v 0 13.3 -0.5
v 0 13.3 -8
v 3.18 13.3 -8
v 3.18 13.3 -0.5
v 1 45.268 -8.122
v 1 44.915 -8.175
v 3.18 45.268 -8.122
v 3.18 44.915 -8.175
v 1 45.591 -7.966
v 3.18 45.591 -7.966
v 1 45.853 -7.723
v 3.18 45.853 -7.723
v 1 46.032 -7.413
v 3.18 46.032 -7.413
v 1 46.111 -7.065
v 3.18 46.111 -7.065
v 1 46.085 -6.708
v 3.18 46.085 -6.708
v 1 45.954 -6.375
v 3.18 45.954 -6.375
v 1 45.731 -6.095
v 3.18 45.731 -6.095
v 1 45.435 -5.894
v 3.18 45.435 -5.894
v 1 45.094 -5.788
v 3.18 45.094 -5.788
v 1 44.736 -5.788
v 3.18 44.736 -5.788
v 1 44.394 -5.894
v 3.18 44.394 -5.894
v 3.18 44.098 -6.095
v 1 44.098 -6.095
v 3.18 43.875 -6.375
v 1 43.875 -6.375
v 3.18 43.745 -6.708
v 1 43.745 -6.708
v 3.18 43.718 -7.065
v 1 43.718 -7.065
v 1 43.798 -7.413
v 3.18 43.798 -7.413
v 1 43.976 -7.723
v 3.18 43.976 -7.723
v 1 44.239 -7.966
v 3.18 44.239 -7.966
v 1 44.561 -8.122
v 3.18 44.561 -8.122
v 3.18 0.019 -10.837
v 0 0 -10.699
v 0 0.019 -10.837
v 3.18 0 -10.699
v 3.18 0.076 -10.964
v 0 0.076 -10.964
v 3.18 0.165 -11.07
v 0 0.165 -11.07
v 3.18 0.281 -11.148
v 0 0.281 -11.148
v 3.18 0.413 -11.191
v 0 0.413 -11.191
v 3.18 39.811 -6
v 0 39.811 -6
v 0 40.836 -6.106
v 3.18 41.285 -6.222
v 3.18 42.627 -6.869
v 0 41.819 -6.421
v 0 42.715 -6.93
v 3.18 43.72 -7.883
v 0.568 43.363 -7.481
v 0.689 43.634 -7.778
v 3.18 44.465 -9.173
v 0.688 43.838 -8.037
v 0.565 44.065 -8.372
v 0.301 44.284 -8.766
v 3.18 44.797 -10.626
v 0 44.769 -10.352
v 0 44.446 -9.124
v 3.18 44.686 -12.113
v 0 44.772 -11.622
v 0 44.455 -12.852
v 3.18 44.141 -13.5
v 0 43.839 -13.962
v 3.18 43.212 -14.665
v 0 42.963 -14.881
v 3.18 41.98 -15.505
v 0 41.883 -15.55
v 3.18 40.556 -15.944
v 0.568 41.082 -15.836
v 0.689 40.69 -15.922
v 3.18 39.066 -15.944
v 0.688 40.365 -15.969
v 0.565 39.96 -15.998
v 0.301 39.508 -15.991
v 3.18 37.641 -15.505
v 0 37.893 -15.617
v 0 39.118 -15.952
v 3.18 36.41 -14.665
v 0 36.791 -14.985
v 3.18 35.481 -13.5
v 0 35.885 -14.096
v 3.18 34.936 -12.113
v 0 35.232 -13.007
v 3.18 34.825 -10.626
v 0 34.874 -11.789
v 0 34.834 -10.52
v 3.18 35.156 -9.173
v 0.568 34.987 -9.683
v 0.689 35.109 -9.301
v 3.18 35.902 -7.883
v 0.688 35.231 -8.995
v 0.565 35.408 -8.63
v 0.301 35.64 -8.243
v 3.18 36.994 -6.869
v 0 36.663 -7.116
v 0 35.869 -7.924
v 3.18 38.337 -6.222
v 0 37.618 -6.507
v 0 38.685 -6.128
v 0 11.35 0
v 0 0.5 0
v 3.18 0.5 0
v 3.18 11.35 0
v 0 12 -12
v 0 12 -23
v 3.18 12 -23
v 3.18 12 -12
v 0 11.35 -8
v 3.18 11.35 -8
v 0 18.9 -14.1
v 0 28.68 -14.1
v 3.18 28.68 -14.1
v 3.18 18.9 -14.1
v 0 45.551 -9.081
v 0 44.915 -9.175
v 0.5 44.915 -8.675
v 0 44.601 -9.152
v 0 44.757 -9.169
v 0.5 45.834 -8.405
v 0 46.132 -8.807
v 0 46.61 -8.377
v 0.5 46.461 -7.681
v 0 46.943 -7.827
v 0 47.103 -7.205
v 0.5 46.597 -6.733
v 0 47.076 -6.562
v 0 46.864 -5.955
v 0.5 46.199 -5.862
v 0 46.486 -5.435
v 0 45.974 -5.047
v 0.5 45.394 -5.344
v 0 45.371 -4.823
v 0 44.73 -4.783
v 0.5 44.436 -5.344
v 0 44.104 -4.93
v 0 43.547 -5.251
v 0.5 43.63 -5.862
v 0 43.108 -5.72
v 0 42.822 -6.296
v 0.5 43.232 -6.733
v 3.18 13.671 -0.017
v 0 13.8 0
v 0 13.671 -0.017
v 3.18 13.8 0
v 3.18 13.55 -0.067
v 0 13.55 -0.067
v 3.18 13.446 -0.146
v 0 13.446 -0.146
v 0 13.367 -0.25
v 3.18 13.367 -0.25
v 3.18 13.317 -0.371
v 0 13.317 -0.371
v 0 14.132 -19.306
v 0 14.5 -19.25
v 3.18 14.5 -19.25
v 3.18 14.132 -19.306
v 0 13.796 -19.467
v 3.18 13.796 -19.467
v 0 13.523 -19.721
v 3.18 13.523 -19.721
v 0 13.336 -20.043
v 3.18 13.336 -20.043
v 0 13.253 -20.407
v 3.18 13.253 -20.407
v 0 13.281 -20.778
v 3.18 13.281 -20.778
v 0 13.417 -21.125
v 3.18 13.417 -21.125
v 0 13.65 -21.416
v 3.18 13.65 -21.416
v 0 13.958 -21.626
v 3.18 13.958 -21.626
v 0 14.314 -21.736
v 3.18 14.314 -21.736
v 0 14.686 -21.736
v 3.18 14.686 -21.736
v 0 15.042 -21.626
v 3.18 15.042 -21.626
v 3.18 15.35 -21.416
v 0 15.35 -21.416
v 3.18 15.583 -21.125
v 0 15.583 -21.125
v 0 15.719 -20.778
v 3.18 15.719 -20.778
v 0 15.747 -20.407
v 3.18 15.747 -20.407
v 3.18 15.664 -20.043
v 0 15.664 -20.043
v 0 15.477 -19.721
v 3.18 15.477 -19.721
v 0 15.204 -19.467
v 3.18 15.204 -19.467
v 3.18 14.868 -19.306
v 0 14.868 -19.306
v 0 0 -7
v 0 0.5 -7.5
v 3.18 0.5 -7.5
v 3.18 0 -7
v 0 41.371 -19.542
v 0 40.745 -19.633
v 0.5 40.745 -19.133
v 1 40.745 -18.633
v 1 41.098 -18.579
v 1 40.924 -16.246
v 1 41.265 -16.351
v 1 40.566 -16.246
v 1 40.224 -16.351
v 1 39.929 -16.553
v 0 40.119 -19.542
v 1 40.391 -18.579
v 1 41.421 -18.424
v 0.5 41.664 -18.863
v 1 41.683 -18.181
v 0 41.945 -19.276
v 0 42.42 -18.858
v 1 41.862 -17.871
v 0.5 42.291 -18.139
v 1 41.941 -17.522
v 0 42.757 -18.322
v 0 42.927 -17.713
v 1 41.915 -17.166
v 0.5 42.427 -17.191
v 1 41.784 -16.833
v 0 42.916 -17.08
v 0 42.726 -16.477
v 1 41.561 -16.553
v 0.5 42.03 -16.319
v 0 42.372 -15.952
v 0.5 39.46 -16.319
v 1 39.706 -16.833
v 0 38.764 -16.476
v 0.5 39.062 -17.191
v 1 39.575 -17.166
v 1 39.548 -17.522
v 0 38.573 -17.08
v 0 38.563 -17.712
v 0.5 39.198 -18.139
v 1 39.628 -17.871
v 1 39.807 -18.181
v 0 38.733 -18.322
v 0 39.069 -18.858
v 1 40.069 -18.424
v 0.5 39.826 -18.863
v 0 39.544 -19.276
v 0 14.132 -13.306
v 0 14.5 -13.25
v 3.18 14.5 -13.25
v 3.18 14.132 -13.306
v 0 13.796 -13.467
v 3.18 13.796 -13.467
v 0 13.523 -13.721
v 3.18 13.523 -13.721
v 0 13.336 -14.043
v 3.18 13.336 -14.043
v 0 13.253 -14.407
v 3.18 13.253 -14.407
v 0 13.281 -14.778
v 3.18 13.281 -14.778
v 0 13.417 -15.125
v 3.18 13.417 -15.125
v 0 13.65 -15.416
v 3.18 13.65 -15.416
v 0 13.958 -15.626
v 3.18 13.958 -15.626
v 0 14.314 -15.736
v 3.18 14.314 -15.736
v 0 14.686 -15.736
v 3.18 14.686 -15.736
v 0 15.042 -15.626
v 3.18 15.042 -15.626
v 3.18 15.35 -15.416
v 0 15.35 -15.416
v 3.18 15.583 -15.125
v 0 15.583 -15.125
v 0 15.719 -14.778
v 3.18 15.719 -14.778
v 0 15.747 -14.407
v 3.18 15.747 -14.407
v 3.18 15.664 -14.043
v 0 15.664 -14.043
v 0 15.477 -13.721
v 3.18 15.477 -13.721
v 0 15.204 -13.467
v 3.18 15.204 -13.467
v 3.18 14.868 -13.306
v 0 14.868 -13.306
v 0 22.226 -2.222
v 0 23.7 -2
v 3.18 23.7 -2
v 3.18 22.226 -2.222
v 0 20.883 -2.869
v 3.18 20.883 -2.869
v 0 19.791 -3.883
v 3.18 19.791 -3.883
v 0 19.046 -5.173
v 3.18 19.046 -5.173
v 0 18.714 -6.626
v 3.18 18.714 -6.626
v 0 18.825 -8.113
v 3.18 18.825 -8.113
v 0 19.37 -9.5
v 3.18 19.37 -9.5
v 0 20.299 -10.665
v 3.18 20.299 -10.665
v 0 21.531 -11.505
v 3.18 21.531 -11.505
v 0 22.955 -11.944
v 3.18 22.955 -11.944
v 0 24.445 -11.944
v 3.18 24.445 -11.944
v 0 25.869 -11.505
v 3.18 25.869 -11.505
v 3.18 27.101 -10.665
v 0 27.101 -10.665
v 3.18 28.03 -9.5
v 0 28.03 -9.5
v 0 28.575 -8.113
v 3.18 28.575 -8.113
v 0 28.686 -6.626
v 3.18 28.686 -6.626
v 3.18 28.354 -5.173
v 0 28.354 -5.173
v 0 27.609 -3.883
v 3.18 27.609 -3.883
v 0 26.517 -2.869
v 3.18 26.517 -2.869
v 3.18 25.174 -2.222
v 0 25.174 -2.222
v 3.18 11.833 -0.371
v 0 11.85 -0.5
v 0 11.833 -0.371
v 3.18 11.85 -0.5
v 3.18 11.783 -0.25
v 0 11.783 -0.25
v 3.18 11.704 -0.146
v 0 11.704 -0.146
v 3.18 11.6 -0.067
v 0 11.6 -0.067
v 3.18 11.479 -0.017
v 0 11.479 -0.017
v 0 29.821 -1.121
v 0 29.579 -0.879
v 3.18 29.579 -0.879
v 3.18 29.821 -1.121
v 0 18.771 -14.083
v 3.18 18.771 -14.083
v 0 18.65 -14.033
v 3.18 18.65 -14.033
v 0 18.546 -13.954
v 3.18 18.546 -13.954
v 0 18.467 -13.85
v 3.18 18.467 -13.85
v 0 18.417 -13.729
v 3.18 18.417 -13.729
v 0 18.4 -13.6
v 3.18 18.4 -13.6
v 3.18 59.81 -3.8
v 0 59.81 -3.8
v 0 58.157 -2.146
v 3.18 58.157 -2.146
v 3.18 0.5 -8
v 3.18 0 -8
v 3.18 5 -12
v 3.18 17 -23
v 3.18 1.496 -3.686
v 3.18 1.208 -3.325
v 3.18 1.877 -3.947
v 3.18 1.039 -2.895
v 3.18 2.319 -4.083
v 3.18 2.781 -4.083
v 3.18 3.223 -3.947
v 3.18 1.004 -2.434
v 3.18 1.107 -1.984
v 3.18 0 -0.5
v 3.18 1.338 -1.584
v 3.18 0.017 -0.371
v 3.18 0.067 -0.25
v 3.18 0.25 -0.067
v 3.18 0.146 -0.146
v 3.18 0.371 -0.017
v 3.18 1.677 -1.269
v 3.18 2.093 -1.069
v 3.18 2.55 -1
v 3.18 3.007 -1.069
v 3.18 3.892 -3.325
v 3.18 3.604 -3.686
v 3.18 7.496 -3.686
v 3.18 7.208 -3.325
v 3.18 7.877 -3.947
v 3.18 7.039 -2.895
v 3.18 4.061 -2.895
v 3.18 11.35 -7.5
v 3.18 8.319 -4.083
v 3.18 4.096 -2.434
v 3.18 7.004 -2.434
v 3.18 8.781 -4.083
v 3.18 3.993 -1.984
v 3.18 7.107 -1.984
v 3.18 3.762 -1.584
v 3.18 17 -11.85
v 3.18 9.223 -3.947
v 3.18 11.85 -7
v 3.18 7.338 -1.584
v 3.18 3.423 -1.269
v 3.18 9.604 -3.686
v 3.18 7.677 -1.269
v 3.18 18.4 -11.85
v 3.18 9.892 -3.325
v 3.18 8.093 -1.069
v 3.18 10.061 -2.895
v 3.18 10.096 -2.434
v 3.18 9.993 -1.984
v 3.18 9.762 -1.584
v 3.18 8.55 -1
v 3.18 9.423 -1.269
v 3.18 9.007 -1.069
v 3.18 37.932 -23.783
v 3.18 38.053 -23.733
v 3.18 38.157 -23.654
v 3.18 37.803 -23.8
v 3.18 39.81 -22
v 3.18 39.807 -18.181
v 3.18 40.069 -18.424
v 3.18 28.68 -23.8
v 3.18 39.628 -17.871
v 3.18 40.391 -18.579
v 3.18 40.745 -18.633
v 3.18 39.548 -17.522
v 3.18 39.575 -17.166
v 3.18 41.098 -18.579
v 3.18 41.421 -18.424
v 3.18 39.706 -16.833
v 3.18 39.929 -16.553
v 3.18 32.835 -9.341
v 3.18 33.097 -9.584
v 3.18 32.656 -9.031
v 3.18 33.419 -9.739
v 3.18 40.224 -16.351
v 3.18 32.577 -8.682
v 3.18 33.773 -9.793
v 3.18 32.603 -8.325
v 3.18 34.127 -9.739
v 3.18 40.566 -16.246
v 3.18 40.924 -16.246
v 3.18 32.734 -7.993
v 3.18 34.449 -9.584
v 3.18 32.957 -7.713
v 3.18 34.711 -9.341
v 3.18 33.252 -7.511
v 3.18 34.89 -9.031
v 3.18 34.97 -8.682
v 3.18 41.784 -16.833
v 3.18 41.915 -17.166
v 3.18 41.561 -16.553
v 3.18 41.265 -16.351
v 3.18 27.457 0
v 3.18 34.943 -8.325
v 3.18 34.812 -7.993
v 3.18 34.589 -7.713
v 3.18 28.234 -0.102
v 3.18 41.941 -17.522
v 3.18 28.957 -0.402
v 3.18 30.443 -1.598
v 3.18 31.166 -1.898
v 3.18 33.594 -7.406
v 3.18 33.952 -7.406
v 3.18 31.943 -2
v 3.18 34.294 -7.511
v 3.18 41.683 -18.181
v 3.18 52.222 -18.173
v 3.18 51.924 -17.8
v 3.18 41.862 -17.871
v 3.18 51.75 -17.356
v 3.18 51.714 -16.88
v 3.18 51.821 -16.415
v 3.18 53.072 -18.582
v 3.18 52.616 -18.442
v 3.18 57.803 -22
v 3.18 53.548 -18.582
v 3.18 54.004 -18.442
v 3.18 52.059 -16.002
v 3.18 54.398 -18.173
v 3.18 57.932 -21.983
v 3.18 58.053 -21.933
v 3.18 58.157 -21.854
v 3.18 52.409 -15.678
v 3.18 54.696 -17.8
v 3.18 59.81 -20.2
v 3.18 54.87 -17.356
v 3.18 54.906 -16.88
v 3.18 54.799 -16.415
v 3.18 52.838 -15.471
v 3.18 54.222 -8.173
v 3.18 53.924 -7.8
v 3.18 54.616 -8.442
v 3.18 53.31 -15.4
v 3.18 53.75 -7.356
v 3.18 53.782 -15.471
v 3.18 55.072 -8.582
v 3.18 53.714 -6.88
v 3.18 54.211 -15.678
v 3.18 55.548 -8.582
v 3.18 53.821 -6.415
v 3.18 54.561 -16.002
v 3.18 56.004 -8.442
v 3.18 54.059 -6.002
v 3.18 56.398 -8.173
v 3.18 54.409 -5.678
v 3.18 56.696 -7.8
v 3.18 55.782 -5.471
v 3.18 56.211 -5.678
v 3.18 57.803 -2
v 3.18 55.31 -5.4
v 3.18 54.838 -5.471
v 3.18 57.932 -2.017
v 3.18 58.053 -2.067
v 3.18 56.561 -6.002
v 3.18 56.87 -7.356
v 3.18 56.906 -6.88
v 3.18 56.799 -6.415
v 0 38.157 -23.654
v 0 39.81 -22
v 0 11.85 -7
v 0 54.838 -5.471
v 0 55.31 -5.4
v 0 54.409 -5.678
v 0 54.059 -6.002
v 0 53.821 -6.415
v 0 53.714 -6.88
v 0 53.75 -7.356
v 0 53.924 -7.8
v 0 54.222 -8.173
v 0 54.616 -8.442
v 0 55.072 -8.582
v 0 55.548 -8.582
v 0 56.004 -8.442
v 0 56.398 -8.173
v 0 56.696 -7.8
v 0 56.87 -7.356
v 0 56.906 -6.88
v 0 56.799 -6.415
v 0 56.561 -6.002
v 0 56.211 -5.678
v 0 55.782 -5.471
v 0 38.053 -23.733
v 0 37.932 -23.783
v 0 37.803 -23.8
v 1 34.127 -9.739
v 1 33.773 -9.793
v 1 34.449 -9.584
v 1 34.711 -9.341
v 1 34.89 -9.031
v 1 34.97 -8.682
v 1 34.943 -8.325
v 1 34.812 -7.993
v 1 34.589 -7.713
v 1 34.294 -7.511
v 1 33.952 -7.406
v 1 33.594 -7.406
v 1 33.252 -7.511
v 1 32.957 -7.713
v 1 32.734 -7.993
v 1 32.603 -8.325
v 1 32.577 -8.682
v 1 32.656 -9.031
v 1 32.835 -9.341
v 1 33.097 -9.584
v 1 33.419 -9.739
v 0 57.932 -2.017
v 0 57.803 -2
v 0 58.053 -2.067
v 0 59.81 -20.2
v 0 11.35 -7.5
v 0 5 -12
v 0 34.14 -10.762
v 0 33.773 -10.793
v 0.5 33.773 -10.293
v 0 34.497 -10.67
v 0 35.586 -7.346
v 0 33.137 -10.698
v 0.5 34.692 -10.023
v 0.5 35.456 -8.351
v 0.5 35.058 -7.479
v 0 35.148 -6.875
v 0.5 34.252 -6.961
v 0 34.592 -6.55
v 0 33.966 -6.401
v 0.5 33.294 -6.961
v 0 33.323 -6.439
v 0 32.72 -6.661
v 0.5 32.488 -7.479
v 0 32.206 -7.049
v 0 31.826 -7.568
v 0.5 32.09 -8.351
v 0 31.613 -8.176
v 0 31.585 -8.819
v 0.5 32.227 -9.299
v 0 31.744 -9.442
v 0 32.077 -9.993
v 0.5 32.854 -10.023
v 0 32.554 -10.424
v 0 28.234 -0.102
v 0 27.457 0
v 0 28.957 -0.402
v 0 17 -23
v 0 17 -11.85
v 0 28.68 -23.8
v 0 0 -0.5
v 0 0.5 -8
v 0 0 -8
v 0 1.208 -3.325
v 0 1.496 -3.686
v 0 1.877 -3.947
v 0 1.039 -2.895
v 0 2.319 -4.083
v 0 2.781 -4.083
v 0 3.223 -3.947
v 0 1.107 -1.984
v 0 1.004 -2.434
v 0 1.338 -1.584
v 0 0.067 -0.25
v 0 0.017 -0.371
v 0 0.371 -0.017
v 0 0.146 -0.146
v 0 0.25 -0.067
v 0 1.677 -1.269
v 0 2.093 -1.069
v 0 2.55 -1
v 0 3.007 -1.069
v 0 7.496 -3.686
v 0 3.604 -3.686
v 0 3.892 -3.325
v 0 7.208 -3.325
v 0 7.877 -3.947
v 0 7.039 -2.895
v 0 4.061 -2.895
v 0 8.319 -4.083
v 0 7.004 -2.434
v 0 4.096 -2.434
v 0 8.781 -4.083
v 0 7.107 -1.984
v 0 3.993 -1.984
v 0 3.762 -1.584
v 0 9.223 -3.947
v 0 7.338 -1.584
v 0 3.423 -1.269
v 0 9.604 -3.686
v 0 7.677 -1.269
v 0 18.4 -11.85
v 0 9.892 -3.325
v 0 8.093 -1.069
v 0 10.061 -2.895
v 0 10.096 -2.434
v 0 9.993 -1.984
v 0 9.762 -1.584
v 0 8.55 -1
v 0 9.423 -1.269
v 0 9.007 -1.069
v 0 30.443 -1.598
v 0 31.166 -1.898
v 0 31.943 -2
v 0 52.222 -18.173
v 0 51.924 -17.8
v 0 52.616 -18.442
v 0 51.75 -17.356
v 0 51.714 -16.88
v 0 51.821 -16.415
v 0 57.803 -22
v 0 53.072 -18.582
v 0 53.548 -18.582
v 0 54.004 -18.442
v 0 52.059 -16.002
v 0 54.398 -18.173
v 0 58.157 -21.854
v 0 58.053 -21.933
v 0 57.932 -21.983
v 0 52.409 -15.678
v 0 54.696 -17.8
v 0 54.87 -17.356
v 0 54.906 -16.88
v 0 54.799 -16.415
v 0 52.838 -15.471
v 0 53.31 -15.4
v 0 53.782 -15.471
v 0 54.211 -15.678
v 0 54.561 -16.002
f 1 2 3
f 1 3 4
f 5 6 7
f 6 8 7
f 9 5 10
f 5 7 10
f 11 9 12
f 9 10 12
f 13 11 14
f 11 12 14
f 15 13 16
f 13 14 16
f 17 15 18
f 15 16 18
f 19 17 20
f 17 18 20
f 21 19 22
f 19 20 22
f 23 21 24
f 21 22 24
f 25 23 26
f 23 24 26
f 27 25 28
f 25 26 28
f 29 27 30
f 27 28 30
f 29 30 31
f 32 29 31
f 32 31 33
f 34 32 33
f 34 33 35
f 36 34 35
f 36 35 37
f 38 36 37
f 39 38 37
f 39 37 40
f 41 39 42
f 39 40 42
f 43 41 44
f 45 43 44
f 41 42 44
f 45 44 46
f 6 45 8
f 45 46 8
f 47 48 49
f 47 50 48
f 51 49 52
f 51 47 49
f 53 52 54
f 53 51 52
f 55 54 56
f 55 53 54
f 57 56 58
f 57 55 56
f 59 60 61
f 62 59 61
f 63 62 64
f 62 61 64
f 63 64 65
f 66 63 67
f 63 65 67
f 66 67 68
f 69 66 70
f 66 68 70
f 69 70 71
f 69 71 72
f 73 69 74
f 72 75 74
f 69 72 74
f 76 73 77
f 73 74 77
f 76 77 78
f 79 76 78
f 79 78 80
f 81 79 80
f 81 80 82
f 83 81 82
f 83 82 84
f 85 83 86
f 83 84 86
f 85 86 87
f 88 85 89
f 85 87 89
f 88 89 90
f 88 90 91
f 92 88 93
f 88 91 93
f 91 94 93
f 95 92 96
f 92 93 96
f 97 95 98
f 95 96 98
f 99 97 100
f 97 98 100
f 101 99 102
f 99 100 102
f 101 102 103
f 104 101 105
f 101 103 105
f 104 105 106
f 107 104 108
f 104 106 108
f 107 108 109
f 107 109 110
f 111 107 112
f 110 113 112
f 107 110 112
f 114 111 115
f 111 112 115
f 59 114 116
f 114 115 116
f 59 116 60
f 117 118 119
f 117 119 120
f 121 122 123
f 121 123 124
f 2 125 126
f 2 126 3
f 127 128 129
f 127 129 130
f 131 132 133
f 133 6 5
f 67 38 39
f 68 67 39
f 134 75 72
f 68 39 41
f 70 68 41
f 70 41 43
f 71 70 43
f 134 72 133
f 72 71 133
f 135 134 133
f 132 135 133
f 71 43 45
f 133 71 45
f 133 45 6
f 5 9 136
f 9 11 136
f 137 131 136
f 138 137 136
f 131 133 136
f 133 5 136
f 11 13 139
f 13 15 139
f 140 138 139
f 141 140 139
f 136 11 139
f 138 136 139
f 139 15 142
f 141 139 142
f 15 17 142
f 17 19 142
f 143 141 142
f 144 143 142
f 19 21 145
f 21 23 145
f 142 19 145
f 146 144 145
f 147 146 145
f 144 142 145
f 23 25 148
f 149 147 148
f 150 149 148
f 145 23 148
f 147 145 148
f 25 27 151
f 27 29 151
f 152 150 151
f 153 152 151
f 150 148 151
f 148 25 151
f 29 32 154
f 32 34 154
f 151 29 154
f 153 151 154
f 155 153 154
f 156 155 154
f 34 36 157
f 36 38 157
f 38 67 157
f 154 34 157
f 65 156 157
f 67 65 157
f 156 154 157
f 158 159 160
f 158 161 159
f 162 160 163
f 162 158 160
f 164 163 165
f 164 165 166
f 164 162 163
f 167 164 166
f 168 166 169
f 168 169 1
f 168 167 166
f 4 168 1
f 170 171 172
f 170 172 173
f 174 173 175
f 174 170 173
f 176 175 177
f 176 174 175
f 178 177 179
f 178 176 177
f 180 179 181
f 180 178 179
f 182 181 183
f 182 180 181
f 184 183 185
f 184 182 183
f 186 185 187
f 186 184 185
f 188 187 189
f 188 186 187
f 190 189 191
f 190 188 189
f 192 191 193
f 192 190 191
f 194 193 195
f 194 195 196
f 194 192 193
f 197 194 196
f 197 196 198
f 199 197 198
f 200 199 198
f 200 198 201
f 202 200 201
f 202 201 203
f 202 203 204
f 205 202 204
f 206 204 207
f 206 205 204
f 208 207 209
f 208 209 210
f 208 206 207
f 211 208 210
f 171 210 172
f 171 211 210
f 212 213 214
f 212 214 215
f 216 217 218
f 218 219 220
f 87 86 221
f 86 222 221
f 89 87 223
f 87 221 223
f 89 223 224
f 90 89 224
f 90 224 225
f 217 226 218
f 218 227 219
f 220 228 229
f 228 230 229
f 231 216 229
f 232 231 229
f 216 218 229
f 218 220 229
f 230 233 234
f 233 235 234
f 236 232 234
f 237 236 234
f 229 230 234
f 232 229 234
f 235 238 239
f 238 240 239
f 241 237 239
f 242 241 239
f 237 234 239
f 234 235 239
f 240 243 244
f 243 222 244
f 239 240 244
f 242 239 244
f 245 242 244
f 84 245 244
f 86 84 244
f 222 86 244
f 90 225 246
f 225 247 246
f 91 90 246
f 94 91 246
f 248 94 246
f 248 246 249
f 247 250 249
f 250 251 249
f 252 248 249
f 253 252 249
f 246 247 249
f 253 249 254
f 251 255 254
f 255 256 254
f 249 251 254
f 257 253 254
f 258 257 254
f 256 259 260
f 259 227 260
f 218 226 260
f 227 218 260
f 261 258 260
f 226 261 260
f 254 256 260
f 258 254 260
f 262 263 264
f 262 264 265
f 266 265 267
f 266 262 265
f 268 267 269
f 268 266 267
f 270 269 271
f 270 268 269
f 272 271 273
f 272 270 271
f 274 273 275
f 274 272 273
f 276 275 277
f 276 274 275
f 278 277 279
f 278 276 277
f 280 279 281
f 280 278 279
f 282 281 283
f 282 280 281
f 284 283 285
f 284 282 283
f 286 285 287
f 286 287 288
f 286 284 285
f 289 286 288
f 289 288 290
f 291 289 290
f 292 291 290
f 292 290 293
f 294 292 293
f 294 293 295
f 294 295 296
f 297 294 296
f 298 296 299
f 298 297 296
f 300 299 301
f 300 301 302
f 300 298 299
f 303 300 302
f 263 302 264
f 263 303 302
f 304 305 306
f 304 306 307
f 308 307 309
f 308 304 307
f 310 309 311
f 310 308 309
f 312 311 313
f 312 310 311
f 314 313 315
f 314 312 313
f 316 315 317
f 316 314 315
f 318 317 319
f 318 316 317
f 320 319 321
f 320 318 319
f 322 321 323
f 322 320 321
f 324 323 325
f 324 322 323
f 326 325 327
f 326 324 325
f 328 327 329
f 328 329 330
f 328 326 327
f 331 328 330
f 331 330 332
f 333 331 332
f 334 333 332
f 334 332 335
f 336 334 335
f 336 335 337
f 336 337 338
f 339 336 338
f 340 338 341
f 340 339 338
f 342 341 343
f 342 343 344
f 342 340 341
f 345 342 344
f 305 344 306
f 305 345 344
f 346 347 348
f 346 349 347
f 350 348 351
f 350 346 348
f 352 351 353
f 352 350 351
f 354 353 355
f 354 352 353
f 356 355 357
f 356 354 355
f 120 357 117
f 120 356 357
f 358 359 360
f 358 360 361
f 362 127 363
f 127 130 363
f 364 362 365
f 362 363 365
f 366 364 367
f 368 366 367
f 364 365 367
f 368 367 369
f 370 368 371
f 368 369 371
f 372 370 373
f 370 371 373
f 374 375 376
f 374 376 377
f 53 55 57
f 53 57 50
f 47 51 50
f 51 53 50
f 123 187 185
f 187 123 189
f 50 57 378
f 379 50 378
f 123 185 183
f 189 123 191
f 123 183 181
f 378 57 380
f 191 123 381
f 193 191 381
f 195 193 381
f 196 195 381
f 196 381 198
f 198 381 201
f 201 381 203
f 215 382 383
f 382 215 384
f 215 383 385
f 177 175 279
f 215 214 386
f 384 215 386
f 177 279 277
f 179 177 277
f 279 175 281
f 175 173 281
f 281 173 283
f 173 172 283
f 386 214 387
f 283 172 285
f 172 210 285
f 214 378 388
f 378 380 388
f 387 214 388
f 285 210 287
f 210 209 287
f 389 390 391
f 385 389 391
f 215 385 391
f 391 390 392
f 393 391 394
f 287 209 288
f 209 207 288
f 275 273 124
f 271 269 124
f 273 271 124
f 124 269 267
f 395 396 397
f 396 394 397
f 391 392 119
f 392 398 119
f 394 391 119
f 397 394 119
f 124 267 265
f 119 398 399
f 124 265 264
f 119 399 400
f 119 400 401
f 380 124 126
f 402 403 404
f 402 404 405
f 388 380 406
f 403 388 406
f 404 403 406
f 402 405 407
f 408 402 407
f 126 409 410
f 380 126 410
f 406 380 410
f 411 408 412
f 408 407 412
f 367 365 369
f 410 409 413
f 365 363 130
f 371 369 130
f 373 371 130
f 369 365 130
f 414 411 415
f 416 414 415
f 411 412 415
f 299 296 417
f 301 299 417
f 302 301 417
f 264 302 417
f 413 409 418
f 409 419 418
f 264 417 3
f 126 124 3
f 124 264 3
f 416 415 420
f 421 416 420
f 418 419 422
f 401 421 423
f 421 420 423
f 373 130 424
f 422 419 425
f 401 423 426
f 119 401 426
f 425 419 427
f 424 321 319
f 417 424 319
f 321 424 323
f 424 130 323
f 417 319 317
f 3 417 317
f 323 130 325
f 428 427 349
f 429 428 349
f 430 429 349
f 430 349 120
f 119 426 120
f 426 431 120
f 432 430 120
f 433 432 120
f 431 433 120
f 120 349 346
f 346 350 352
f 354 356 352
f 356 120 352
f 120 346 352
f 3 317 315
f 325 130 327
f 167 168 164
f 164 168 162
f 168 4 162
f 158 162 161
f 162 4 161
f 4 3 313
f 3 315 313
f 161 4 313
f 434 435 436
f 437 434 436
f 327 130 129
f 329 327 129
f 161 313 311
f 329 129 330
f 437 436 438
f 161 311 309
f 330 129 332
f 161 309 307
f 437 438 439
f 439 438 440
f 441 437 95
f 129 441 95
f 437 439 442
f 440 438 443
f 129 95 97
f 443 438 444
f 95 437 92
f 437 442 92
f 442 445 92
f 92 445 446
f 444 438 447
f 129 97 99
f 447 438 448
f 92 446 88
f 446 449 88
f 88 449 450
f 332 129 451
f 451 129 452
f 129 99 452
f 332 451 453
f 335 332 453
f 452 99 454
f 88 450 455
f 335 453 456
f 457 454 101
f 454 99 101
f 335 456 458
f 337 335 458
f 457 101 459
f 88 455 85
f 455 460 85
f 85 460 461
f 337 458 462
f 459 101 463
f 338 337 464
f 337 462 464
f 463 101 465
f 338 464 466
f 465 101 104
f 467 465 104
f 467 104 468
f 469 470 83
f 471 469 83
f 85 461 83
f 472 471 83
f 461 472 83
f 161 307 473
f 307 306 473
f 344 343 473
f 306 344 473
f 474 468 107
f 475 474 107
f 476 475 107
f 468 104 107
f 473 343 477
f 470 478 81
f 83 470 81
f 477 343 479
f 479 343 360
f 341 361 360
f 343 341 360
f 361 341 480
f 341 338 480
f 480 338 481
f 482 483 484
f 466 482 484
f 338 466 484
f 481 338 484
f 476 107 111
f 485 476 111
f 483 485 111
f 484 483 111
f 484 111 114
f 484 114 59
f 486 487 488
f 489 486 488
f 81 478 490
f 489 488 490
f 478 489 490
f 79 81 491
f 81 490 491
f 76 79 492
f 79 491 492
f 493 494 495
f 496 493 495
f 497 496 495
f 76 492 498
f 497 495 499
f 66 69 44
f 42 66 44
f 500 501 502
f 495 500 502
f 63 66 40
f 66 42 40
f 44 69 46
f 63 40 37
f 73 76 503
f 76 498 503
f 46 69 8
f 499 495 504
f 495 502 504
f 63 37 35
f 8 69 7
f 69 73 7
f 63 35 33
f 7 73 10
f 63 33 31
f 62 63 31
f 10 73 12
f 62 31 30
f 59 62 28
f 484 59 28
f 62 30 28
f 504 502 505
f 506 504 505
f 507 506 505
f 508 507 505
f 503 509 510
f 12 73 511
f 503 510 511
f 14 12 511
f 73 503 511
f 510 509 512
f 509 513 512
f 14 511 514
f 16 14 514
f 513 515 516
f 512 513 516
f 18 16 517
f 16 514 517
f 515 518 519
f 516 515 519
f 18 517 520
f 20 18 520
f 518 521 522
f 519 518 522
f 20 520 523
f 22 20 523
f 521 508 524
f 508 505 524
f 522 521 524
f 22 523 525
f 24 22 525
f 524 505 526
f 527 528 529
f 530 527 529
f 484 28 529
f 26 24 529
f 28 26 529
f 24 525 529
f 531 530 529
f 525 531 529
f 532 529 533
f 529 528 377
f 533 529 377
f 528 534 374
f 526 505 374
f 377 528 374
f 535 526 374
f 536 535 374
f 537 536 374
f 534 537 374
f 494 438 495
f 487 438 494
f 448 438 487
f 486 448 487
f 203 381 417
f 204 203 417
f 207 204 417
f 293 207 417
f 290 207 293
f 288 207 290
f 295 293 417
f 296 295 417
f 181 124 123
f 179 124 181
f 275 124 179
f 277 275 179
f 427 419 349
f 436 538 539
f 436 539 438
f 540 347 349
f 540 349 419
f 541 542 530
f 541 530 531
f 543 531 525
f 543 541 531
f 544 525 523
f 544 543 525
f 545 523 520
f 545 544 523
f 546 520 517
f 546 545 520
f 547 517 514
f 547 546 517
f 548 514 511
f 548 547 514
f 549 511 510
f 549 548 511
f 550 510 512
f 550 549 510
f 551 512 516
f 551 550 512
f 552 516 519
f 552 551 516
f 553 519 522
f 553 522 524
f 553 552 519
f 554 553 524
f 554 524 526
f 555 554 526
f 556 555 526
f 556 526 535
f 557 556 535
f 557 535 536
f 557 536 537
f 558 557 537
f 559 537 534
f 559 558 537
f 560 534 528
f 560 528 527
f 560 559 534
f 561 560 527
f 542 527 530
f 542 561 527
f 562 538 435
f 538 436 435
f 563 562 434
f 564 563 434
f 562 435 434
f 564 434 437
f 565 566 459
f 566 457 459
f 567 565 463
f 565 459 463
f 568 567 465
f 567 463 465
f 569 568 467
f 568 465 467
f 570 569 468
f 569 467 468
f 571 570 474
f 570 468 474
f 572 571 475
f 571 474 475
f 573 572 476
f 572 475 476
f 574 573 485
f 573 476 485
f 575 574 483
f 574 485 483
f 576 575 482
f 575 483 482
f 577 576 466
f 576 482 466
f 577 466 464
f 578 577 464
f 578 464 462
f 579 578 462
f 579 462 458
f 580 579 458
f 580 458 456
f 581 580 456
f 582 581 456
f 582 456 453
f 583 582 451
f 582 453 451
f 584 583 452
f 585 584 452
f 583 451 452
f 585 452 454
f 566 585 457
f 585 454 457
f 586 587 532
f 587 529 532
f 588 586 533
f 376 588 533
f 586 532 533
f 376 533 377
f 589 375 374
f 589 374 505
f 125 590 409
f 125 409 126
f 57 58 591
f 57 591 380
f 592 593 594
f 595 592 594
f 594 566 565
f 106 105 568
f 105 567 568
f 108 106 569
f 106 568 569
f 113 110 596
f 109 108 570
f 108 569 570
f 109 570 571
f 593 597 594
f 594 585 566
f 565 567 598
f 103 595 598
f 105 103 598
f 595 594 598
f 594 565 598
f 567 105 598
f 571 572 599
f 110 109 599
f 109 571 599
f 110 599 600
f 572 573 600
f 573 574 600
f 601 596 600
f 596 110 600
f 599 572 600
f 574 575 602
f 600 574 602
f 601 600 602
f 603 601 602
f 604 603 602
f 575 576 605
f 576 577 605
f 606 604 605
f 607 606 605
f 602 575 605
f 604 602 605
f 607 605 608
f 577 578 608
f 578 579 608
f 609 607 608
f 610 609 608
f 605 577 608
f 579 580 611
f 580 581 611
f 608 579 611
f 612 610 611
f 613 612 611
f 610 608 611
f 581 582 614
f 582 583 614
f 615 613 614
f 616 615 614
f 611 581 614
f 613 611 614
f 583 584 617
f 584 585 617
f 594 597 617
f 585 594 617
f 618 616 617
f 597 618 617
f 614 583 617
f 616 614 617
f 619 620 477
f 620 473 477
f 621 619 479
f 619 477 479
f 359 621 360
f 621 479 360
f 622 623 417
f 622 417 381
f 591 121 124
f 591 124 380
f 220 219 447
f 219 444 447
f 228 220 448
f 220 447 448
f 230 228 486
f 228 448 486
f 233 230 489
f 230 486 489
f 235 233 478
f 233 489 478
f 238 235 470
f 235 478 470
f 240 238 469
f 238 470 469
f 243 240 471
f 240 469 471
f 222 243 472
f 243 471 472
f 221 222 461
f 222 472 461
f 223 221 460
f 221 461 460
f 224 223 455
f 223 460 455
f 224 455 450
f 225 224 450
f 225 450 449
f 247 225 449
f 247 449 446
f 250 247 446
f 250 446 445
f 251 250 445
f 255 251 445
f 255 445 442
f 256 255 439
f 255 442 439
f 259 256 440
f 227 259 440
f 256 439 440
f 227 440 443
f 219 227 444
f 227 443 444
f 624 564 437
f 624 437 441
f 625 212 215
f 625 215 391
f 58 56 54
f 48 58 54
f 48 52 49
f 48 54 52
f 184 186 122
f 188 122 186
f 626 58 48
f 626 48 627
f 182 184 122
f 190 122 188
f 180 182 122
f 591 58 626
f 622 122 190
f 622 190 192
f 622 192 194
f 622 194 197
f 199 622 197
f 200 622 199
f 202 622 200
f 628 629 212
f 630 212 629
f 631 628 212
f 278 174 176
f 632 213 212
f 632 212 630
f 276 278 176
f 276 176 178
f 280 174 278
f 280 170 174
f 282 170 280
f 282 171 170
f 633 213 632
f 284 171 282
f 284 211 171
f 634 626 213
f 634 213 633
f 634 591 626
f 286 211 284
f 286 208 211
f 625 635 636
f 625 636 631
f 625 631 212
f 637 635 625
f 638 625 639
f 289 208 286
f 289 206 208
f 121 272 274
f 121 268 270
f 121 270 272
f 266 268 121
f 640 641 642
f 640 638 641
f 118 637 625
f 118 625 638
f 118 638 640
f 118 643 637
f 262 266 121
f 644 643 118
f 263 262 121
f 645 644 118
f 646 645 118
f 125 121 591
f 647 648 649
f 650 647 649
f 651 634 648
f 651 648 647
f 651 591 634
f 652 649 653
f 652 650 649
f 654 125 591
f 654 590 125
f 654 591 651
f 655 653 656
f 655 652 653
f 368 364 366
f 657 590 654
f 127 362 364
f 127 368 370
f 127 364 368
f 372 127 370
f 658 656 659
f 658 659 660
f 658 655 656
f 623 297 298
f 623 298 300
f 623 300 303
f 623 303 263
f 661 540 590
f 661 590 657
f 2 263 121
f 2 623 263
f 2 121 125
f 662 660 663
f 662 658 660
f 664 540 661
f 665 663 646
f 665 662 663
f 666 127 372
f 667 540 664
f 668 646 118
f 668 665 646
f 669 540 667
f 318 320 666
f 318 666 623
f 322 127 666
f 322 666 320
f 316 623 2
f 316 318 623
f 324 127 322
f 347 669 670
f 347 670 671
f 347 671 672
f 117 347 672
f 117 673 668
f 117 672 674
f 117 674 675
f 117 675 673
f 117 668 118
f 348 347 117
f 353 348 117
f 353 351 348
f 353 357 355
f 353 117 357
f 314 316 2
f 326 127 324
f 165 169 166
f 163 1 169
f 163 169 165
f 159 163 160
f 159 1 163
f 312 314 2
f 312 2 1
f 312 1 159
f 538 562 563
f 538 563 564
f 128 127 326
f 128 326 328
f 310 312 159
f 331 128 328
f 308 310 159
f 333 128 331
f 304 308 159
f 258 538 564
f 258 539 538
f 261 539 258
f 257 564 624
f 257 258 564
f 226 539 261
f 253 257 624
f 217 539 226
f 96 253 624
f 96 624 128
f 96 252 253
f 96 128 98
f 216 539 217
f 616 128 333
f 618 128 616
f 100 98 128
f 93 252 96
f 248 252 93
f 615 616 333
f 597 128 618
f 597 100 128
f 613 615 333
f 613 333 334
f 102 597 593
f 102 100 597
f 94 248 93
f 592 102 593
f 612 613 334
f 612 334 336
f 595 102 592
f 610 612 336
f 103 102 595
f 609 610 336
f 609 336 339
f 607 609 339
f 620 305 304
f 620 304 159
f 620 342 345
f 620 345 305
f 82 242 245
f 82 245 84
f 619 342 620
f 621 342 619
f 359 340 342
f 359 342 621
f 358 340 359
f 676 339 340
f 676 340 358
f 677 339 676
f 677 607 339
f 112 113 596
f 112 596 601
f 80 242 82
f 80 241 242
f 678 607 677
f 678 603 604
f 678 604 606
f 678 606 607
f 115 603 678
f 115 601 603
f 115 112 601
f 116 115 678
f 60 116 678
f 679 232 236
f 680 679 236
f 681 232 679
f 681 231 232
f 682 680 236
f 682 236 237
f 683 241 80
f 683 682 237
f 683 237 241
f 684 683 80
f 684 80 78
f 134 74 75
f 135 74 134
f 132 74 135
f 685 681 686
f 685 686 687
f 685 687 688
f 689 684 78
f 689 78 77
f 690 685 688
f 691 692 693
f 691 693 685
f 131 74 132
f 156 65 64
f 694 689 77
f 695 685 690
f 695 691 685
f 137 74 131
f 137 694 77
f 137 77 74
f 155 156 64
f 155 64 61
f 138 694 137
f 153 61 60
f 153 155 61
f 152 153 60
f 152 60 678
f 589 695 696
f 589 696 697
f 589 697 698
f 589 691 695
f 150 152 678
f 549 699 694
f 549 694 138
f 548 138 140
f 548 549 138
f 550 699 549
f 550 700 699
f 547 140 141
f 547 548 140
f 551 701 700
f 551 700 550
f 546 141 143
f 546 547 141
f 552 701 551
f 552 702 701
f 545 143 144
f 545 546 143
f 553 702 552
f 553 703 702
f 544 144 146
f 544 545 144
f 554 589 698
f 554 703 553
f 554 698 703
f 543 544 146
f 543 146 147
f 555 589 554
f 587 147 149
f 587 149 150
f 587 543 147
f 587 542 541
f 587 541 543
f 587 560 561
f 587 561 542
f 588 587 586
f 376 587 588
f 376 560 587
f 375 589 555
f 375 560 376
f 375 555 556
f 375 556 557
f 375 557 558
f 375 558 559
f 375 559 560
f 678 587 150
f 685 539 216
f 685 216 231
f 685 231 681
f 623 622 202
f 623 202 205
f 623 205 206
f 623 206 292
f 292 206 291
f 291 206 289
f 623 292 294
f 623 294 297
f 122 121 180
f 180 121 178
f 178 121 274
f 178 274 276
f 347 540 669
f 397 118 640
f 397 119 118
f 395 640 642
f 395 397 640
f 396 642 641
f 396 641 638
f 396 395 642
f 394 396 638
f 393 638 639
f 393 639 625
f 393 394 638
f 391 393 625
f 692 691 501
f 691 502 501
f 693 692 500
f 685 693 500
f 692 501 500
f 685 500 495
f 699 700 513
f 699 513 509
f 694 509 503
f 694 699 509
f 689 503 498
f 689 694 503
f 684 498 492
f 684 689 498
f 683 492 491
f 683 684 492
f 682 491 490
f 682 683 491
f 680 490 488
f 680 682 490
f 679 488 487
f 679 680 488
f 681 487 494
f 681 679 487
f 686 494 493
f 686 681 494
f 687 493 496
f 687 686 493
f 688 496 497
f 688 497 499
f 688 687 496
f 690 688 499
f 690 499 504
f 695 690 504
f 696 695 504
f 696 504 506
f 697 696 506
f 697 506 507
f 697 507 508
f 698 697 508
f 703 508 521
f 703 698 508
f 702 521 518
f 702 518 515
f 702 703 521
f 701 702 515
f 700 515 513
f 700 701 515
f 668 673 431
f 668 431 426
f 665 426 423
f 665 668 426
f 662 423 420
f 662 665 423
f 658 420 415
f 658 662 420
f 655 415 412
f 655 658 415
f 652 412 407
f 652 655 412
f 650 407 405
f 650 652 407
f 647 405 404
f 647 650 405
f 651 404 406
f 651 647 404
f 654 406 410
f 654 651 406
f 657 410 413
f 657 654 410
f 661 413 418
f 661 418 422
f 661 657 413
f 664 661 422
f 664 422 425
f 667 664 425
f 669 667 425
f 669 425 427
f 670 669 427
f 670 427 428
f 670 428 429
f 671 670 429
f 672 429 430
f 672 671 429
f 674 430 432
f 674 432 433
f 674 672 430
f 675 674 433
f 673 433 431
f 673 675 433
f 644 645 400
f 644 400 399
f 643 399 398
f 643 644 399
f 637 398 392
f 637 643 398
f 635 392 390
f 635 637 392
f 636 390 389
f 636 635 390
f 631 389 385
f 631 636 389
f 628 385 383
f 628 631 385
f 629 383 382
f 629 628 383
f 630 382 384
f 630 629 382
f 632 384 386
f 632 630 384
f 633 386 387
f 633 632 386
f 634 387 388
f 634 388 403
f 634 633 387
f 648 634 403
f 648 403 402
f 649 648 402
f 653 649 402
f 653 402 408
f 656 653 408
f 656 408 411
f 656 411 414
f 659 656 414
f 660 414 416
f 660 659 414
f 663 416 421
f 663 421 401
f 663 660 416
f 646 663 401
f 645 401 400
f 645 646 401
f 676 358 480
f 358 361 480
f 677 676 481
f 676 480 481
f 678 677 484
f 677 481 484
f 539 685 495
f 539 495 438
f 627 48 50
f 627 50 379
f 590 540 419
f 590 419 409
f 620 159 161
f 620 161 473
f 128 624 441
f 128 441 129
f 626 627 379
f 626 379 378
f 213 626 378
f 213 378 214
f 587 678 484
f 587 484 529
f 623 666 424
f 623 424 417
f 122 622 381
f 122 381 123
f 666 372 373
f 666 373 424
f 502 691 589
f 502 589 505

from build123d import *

# Parameters (mm, degrees)
SKETCH1_R                                       = 5
SKETCH1_R_2                                     = 1.6
SKETCH1_R_3                                     = 1.25
SKETCH1_R_4                                     = 1.55
BOSS_EXTRUDE1_DEPTH                             = 3.18
CHAMFER1_SIZE                                   = 5
CHAMFER1_SIZE2                                  = 0.881634904
CSK_FOR_M2_FLAT_HEAD_MACHINE_SCREW1_D           = 2.4
CSK_FOR_M2_FLAT_HEAD_MACHINE_SCREW1_DEPTH       = 3.508967257
CSK_FOR_M2_FLAT_HEAD_MACHINE_SCREW1_CSINK_D     = 4.4
CSK_FOR_M2_FLAT_HEAD_MACHINE_SCREW1_CSINK_ANGLE = 90
CSK_FOR_M2_FLAT_HEAD_MACHINE_SCREW1_TIP         = 0.721032743
SKETCH3_R                                       = 5
CUT_EXTRUDE4_DEPTH                              = 65.449891389
FILLET2_R                                       = 3
CHAMFER2_SIZE                                   = 1.8
FILLET4_R                                       = 0.5


with BuildPart() as part:
    # Sketch1 → Boss-Extrude1 (new body)
    with BuildSketch(Plane(origin=(0, 0, 0), x_dir=(0, 0, -1), z_dir=(1, 0, 0))):
        Polygon((0, 0), (0, 11.85), (7, 11.85), (7.5, 11.35), (8, 11.35), (8, 13.3), (0, 13.3), (0, 28.7), (2, 30.7), (2, 59.81), (22, 59.81), (22, 39.81), (23.8, 39.81), (23.8, 28.68), (14.1, 28.68), (14.1, 18.4), (11.85, 18.4), (11.85, 17), (23, 17), (23, 12), (12, 12), (12, 0), (8, 0), (8, 0.5), (7.5, 0.5), (7, 0), align=None)
        with Locations(Location((7, 23.7, 0), (0, 0, 180))):
            Circle(SKETCH1_R, mode=Mode.SUBTRACT)
        with Locations(Location((7, 55.31, 0), (0, 0, 180))):
            Circle(SKETCH1_R_2, mode=Mode.SUBTRACT)
        with Locations(Location((17, 53.31, 0), (0, 0, 180))):
            Circle(SKETCH1_R_2, mode=Mode.SUBTRACT)
        with Locations(Location((20.5, 14.5, 0), (0, 0, 180))):
            Circle(SKETCH1_R_3, mode=Mode.SUBTRACT)
        with Locations(Location((14.5, 14.5, 0), (0, 0, 180))):
            Circle(SKETCH1_R_3, mode=Mode.SUBTRACT)
        with Locations(Location((2.55, 2.55, 0), (0, 0, 180))):
            Circle(SKETCH1_R_4, mode=Mode.SUBTRACT)
        with Locations(Location((2.55, 8.55, 0), (0, 0, 180))):
            Circle(SKETCH1_R_4, mode=Mode.SUBTRACT)
    extrude(amount=BOSS_EXTRUDE1_DEPTH)

    # Chamfer1
    chamfer1_edges = [part.edges().sort_by_distance(p)[0] for p in [
        (1.59, 0, -12),
    ]]
    chamfer1_side = [part.faces().sort_by_distance(p)[0] for p in [
        (1.59, 6, -12),
    ]]
    chamfer(chamfer1_edges, length=CHAMFER1_SIZE, length2=CHAMFER1_SIZE2, reference=chamfer1_side[0])

    # CSK for M2 Flat Head Machine Screw1
    with Locations(Plane.ZY):
        with Locations((-6.974936087, 44.914674329), (-17.432559713, 40.744769284), (-8.592504199, 33.773154083)):
            CounterSinkHole(CSK_FOR_M2_FLAT_HEAD_MACHINE_SCREW1_D / 2, CSK_FOR_M2_FLAT_HEAD_MACHINE_SCREW1_CSINK_D / 2, depth=CSK_FOR_M2_FLAT_HEAD_MACHINE_SCREW1_DEPTH, counter_sink_angle=CSK_FOR_M2_FLAT_HEAD_MACHINE_SCREW1_CSINK_ANGLE)
            with Locations((0, 0, -(CSK_FOR_M2_FLAT_HEAD_MACHINE_SCREW1_DEPTH + CSK_FOR_M2_FLAT_HEAD_MACHINE_SCREW1_TIP / 2))):  # 118° drill point
                Cone(0, CSK_FOR_M2_FLAT_HEAD_MACHINE_SCREW1_D / 2, CSK_FOR_M2_FLAT_HEAD_MACHINE_SCREW1_TIP, mode=Mode.SUBTRACT)

    # Sketch3 → Cut-Extrude4 (cut, through all)
    with BuildSketch(Plane.ZY):
        with Locations((-11, 39.810865899)):
            Circle(SKETCH3_R)
    extrude(amount=-CUT_EXTRUDE4_DEPTH, mode=Mode.SUBTRACT)

    # Fillet2
    fillet2_edges = [part.edges().sort_by_distance(p)[0] for p in [
        (1.59, 28.7, 0),
        (1.59, 30.7, -2),
    ]]
    fillet(fillet2_edges, radius=FILLET2_R)

    # Chamfer2
    chamfer2_edges = [part.edges().sort_by_distance(p)[0] for p in [
        (1.59, 59.81, -22),
        (1.59, 59.81, -2),
        (1.59, 39.81, -23.8),
    ]]
    chamfer(chamfer2_edges, length=CHAMFER2_SIZE - 0.0001)  # a hair under: the kernel refuses the full size

    # Fillet4
    fillet4_edges = [part.edges().sort_by_distance(p)[0] for p in [
        (1.59, 0, -11.118365096),
        (1.59, 38.0101, -23.8),
        (1.59, 58.0101, -22),
        (1.59, 58.0101, -2),
        (1.59, 0, 0),
        (1.59, 11.85, 0),
        (1.59, 13.3, 0),
        (1.59, 18.4, -14.1),
    ]]
    fillet(fillet4_edges, radius=FILLET4_R)


solid = part.part
